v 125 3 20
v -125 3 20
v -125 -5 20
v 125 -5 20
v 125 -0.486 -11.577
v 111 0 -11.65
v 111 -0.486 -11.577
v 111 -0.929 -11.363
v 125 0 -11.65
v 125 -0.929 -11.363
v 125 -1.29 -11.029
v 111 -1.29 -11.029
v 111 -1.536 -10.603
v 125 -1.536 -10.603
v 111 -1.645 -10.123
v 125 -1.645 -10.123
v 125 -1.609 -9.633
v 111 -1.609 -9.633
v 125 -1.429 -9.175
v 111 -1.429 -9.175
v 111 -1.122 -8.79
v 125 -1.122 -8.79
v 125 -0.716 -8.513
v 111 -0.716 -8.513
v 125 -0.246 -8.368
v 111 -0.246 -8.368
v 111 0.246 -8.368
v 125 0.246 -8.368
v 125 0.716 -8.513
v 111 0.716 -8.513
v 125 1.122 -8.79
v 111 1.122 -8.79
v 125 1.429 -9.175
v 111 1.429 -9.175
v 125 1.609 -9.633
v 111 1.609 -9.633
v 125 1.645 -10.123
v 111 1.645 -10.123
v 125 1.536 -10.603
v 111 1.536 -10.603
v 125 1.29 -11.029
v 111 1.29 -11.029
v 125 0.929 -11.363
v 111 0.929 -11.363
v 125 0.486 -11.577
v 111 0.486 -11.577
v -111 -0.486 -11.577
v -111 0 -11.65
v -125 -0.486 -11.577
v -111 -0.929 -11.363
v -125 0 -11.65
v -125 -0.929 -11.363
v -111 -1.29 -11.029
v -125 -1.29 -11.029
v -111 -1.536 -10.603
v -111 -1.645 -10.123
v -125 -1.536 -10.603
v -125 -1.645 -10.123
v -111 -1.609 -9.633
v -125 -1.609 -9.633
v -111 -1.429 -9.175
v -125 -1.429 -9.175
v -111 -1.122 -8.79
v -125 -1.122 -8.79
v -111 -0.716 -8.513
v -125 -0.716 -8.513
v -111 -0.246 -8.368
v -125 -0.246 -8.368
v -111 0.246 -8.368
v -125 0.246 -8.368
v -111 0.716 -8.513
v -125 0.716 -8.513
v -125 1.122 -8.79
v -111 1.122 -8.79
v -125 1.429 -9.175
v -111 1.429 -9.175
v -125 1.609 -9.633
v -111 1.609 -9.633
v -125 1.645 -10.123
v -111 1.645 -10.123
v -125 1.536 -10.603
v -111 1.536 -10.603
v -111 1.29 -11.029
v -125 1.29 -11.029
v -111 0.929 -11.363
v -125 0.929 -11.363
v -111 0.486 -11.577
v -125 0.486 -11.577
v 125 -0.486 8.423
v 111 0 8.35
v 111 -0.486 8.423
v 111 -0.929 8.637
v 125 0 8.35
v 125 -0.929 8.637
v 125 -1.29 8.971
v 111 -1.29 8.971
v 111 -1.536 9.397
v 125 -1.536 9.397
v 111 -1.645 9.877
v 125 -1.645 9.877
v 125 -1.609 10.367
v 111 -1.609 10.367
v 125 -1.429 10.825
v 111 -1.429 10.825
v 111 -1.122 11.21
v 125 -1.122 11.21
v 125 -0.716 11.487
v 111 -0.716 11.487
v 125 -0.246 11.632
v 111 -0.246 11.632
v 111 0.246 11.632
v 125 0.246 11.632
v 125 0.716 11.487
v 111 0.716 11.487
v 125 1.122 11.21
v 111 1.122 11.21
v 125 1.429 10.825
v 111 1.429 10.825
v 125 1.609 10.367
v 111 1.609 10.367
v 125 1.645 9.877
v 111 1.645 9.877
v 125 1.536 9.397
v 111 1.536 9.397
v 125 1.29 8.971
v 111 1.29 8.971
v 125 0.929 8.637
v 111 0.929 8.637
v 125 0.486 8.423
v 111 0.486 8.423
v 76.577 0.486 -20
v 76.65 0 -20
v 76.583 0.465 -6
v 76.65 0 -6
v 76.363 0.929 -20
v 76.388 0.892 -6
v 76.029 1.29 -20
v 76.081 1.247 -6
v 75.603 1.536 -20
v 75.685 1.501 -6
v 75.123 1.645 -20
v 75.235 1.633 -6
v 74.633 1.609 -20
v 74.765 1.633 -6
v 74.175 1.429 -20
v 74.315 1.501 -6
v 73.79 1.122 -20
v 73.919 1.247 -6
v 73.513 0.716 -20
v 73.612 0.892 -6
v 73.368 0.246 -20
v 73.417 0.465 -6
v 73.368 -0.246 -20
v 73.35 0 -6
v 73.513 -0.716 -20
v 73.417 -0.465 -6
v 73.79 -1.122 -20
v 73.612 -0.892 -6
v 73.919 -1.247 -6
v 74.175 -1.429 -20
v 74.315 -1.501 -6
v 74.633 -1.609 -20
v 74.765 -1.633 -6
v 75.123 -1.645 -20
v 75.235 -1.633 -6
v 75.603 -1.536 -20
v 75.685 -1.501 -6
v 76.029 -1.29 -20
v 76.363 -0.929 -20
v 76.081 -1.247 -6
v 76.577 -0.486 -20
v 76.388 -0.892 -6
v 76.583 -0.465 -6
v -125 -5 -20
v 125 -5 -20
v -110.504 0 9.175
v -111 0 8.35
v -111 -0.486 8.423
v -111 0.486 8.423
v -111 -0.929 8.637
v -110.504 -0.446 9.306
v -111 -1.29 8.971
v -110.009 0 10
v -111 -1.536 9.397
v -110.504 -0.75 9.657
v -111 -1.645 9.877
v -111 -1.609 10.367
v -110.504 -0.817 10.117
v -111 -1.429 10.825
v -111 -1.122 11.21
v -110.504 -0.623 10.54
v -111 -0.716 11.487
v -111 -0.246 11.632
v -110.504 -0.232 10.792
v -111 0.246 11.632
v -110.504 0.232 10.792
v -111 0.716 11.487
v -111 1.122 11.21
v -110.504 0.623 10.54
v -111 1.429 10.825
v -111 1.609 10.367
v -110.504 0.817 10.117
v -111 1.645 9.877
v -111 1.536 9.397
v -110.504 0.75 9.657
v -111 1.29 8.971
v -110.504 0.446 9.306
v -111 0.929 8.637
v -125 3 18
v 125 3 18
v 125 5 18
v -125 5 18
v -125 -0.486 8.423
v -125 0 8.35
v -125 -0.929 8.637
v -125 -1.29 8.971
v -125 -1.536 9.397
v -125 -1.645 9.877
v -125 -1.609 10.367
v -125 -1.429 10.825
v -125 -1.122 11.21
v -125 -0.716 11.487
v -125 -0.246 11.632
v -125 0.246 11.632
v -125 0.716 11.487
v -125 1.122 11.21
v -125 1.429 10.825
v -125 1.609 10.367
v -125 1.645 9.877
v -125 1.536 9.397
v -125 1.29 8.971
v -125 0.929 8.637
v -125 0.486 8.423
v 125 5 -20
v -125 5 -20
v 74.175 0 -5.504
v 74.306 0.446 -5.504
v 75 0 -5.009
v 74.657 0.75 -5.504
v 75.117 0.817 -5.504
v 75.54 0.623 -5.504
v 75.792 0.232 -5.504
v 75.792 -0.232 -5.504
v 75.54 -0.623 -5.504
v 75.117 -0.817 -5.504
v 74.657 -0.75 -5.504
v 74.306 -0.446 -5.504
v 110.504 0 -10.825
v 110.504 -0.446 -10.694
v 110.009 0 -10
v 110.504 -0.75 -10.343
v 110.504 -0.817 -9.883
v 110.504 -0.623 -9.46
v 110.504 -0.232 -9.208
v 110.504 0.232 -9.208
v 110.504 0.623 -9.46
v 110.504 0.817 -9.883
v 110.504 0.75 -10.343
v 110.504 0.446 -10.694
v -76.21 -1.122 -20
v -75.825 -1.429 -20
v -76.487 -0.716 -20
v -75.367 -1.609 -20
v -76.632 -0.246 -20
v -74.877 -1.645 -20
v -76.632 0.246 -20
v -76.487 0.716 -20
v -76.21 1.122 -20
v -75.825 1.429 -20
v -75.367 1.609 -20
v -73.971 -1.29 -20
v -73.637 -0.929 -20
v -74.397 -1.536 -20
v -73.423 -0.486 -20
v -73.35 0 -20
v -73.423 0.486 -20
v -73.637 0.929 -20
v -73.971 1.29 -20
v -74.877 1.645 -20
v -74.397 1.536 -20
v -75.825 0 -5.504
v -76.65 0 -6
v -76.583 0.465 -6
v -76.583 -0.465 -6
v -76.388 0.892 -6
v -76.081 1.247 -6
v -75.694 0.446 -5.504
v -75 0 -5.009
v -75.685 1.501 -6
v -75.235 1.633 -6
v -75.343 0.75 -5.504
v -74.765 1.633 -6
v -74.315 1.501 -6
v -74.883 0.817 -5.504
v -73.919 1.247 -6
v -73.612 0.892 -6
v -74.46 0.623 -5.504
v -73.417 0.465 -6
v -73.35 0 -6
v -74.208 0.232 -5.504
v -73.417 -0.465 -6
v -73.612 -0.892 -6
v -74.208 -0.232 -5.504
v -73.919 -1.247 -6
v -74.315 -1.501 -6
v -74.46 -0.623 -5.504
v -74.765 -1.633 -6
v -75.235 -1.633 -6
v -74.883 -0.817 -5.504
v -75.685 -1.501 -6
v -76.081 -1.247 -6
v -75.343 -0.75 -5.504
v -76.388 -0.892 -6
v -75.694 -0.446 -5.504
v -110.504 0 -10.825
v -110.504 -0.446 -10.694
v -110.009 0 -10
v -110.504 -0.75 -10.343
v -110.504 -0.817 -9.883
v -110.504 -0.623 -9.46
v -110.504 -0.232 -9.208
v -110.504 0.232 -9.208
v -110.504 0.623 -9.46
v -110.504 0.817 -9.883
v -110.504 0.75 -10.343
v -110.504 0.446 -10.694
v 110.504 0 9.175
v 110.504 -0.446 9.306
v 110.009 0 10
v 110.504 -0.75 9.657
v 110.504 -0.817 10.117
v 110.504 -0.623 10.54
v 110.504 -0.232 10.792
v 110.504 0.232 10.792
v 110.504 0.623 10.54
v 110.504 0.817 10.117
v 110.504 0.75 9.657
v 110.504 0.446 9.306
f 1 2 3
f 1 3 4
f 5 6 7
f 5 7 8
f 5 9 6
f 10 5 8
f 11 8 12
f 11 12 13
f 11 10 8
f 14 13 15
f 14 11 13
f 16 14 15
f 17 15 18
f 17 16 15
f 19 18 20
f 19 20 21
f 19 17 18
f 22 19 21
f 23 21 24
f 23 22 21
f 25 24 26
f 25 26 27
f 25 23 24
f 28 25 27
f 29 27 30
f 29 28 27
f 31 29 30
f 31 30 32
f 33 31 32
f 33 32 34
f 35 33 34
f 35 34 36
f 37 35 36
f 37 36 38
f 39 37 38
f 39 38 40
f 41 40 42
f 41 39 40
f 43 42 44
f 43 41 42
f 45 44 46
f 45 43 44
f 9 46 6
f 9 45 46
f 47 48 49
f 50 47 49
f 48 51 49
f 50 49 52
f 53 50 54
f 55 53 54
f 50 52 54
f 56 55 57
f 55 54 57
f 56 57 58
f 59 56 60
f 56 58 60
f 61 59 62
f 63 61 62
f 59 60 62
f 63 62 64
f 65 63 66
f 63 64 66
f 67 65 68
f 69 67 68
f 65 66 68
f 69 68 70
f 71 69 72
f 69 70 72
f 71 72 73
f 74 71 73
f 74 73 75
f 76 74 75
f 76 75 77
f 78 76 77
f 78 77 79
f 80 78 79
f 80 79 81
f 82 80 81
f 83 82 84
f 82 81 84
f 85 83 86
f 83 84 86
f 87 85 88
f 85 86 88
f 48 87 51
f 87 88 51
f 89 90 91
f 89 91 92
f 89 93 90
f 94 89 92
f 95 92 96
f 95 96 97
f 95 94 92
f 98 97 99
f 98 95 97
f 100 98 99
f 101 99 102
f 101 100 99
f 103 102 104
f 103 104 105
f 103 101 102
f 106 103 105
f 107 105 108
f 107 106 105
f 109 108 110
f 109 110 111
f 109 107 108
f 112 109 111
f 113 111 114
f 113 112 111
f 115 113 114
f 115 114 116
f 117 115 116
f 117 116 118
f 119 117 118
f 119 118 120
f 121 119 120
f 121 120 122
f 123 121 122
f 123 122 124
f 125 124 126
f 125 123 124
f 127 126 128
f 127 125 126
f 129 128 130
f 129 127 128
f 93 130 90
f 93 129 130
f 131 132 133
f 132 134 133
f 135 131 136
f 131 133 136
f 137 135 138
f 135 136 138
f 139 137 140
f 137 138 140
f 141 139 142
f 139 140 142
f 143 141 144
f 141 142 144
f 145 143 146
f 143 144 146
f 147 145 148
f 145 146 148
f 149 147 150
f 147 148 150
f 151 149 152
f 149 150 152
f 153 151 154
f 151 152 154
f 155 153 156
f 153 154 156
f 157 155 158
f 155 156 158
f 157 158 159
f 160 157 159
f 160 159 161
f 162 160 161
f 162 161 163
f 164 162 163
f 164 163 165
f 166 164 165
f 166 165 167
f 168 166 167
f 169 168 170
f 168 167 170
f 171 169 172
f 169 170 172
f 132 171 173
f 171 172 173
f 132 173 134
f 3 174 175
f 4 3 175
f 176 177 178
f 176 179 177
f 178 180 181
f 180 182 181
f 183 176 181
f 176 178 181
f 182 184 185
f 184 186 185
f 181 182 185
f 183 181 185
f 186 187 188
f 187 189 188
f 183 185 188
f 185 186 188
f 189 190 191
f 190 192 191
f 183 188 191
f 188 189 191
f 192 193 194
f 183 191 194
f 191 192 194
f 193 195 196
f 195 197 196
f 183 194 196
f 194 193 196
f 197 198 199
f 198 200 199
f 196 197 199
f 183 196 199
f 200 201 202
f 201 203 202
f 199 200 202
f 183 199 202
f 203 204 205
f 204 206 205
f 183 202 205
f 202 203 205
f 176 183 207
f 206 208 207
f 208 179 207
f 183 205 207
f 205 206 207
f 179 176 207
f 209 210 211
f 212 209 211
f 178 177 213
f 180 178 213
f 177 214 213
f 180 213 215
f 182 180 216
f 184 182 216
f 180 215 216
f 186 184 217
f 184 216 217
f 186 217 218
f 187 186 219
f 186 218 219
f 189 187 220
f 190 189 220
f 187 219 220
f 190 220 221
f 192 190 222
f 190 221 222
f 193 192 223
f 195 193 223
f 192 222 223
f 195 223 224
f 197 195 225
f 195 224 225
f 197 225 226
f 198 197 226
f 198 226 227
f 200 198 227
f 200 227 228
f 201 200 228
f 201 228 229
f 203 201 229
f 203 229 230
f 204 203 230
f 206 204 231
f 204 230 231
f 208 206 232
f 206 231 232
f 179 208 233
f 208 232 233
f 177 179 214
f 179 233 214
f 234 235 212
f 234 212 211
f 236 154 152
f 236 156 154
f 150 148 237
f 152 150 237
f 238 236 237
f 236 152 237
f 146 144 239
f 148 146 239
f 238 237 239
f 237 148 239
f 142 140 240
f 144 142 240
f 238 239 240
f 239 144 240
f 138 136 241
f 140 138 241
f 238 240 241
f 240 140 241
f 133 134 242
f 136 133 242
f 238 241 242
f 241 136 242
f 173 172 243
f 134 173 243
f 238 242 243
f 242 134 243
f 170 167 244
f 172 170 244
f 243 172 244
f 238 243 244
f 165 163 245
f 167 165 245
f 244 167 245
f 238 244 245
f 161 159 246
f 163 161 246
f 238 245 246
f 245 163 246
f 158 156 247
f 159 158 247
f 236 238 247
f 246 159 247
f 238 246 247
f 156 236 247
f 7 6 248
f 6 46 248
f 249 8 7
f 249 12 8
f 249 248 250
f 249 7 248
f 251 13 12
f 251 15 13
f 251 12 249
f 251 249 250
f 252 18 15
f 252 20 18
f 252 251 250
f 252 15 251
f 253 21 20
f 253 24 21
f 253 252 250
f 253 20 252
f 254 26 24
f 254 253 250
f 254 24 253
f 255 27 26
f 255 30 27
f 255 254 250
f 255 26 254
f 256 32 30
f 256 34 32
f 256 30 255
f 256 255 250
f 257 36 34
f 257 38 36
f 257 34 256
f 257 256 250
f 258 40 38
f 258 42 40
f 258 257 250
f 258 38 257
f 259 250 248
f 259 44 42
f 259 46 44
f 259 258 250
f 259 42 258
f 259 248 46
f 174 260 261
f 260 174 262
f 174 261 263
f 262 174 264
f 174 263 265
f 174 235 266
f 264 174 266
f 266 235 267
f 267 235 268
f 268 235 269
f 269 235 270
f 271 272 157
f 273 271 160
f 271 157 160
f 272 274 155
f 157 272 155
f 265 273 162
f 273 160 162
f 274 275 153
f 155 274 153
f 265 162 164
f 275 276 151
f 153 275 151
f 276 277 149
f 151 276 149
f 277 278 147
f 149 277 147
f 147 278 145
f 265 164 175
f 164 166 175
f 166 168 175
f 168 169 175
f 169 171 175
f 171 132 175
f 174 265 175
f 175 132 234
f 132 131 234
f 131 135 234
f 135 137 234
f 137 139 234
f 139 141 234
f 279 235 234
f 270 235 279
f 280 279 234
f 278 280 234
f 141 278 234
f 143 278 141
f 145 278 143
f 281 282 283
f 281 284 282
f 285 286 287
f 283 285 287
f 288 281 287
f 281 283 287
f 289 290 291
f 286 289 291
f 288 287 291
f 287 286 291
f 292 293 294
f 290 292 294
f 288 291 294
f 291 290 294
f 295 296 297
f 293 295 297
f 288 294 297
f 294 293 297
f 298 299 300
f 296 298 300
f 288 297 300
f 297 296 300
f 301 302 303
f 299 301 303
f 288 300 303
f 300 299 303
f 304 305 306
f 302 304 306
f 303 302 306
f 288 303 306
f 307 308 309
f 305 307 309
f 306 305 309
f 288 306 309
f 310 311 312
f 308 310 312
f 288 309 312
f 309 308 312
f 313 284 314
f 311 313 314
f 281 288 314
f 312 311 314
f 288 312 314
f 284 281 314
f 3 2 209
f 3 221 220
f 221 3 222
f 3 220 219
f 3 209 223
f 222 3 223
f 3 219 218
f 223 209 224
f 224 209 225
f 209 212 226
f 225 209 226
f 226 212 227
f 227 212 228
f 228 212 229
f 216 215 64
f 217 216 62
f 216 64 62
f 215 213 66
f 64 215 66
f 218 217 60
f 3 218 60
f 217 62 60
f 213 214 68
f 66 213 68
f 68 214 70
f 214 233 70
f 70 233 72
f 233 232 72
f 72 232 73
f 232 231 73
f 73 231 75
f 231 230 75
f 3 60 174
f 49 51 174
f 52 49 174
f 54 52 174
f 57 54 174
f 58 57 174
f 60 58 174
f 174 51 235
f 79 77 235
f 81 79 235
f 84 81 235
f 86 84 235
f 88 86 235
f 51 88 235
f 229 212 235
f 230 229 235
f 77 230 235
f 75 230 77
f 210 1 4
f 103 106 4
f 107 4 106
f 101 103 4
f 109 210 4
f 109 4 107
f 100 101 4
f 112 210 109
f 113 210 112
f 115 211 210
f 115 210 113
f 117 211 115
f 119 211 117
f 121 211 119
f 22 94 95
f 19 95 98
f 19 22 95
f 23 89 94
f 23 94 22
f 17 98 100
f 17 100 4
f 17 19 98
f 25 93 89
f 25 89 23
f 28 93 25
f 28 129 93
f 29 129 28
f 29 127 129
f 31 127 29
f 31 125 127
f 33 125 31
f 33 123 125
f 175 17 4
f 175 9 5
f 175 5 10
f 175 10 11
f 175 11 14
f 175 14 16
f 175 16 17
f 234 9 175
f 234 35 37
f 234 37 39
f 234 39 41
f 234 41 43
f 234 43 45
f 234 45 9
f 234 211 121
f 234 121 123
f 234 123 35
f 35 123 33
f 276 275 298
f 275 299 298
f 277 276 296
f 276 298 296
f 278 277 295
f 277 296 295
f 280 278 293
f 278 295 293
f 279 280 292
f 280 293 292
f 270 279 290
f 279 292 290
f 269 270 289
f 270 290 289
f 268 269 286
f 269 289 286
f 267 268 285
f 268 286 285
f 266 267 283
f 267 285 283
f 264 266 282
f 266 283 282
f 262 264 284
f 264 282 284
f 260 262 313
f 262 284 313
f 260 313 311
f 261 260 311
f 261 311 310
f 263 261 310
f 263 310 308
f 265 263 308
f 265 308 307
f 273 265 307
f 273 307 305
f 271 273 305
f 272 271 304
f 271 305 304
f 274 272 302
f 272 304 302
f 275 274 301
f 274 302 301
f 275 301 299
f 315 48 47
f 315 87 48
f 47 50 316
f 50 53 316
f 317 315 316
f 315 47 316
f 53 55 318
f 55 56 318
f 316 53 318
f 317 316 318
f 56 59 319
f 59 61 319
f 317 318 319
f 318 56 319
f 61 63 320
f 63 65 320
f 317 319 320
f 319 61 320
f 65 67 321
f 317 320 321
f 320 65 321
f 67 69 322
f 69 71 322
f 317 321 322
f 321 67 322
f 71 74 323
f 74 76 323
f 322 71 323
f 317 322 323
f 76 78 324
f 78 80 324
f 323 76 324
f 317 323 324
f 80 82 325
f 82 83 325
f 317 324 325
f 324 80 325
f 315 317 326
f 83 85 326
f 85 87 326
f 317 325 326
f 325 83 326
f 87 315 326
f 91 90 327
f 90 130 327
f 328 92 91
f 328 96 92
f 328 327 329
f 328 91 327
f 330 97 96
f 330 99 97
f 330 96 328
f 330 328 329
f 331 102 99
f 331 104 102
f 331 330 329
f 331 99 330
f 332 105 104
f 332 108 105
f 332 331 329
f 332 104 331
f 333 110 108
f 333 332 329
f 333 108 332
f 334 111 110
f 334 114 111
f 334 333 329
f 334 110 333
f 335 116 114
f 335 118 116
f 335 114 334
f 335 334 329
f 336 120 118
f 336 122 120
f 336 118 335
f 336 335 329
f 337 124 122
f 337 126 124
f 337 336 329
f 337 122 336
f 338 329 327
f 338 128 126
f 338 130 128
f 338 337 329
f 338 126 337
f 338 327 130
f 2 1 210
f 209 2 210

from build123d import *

# Parameters (mm, degrees)
SKETCH1_W                  = 250
SKETCH1_H                  = 40
BOSS_EXTRUDE1_DEPTH        = 5
SKETCH5_W                  = 2
SKETCH5_H                  = 2
CUT_EXTRUDE2_DEPTH         = 126
CUT_EXTRUDE2_DEPTH_BACK    = 126
M4_TAPPED_HOLE1_AT_2_COUNT = 2
M4_TAPPED_HOLE1_AT_2_PITCH = 20
M4X0_7_TAPPED_HOLE1_D      = 3.3
M4X0_7_TAPPED_HOLE1_DEPTH  = 14
M4X0_7_TAPPED_HOLE1_TIP    = 0.991420021


with BuildPart() as part:
    # Sketch1 → Boss-Extrude1 (new body, symmetric)
    with BuildSketch(Plane(origin=(0, 0, 0), x_dir=(1, 0, 0), z_dir=(0, 1, 0))):
        Rectangle(SKETCH1_W, SKETCH1_H)
    extrude(amount=BOSS_EXTRUDE1_DEPTH, both=True)

    # Sketch5 → Cut-Extrude2 (cut, two sides)
    with BuildSketch(Plane(origin=(0, 0, 0), x_dir=(0, 0, -1), z_dir=(1, 0, 0))) as cut_extrude2_sk:
        with Locations((-19, 4)):
            Rectangle(SKETCH5_W, SKETCH5_H)
    extrude(amount=CUT_EXTRUDE2_DEPTH, mode=Mode.SUBTRACT)
    extrude(cut_extrude2_sk.sketch, amount=-CUT_EXTRUDE2_DEPTH_BACK, mode=Mode.SUBTRACT)

    # Sketch8 → M4 Tapped Hole1 (revolve, cut)
    with BuildSketch(Plane(origin=(125, 0, -10), x_dir=(0, 0, -1), z_dir=(0, 1, 0))):
        Polygon((0, 0), (0, 14.991420021), (1.65, 14), (1.65, 0), align=None)
    m4_tapped_hole1 = revolve(axis=Axis((131.35, 0, -10), (-1, 0, 0)), mode=Mode.SUBTRACT)

    # M4 Tapped Hole1 at 2: M4 Tapped Hole1 ×2
    with Locations(*[(0, 0, i * M4_TAPPED_HOLE1_AT_2_PITCH) for i in range(1, M4_TAPPED_HOLE1_AT_2_COUNT)]):
        add(m4_tapped_hole1, mode=Mode.SUBTRACT)

    # Mirror1: M4 Tapped Hole1 across plane
    add(m4_tapped_hole1.mirror(Plane(origin=(0, 0, 0), x_dir=(0, 0, 1), z_dir=(1, 0, 0))), mode=Mode.SUBTRACT)

    # Mirror1 copy 1 sketch → Mirror1 copy 1 (revolve, cut)
    with BuildSketch(Plane(origin=(-125, 0, 10), x_dir=(0, 0, -1), z_dir=(0, 1, 0))):
        Polygon((0, 0), (0, -14.991420021), (1.65, -14), (1.65, 0), align=None)
    revolve(axis=Axis((-131.35, 0, 10), (-1, 0, 0)), mode=Mode.SUBTRACT)

    # M4x0.7 Tapped Hole1
    with Locations(Plane(origin=(0, 0, -20), x_dir=(-1, 0, 0), z_dir=(0, 0, -1))):
        with Locations((-75, 0), (75, 0)):
            Hole(M4X0_7_TAPPED_HOLE1_D / 2, depth=M4X0_7_TAPPED_HOLE1_DEPTH)
            with Locations((0, 0, -(M4X0_7_TAPPED_HOLE1_DEPTH + M4X0_7_TAPPED_HOLE1_TIP / 2))):  # 118° drill point
                Cone(0, M4X0_7_TAPPED_HOLE1_D / 2, M4X0_7_TAPPED_HOLE1_TIP, mode=Mode.SUBTRACT)


solid = part.part
